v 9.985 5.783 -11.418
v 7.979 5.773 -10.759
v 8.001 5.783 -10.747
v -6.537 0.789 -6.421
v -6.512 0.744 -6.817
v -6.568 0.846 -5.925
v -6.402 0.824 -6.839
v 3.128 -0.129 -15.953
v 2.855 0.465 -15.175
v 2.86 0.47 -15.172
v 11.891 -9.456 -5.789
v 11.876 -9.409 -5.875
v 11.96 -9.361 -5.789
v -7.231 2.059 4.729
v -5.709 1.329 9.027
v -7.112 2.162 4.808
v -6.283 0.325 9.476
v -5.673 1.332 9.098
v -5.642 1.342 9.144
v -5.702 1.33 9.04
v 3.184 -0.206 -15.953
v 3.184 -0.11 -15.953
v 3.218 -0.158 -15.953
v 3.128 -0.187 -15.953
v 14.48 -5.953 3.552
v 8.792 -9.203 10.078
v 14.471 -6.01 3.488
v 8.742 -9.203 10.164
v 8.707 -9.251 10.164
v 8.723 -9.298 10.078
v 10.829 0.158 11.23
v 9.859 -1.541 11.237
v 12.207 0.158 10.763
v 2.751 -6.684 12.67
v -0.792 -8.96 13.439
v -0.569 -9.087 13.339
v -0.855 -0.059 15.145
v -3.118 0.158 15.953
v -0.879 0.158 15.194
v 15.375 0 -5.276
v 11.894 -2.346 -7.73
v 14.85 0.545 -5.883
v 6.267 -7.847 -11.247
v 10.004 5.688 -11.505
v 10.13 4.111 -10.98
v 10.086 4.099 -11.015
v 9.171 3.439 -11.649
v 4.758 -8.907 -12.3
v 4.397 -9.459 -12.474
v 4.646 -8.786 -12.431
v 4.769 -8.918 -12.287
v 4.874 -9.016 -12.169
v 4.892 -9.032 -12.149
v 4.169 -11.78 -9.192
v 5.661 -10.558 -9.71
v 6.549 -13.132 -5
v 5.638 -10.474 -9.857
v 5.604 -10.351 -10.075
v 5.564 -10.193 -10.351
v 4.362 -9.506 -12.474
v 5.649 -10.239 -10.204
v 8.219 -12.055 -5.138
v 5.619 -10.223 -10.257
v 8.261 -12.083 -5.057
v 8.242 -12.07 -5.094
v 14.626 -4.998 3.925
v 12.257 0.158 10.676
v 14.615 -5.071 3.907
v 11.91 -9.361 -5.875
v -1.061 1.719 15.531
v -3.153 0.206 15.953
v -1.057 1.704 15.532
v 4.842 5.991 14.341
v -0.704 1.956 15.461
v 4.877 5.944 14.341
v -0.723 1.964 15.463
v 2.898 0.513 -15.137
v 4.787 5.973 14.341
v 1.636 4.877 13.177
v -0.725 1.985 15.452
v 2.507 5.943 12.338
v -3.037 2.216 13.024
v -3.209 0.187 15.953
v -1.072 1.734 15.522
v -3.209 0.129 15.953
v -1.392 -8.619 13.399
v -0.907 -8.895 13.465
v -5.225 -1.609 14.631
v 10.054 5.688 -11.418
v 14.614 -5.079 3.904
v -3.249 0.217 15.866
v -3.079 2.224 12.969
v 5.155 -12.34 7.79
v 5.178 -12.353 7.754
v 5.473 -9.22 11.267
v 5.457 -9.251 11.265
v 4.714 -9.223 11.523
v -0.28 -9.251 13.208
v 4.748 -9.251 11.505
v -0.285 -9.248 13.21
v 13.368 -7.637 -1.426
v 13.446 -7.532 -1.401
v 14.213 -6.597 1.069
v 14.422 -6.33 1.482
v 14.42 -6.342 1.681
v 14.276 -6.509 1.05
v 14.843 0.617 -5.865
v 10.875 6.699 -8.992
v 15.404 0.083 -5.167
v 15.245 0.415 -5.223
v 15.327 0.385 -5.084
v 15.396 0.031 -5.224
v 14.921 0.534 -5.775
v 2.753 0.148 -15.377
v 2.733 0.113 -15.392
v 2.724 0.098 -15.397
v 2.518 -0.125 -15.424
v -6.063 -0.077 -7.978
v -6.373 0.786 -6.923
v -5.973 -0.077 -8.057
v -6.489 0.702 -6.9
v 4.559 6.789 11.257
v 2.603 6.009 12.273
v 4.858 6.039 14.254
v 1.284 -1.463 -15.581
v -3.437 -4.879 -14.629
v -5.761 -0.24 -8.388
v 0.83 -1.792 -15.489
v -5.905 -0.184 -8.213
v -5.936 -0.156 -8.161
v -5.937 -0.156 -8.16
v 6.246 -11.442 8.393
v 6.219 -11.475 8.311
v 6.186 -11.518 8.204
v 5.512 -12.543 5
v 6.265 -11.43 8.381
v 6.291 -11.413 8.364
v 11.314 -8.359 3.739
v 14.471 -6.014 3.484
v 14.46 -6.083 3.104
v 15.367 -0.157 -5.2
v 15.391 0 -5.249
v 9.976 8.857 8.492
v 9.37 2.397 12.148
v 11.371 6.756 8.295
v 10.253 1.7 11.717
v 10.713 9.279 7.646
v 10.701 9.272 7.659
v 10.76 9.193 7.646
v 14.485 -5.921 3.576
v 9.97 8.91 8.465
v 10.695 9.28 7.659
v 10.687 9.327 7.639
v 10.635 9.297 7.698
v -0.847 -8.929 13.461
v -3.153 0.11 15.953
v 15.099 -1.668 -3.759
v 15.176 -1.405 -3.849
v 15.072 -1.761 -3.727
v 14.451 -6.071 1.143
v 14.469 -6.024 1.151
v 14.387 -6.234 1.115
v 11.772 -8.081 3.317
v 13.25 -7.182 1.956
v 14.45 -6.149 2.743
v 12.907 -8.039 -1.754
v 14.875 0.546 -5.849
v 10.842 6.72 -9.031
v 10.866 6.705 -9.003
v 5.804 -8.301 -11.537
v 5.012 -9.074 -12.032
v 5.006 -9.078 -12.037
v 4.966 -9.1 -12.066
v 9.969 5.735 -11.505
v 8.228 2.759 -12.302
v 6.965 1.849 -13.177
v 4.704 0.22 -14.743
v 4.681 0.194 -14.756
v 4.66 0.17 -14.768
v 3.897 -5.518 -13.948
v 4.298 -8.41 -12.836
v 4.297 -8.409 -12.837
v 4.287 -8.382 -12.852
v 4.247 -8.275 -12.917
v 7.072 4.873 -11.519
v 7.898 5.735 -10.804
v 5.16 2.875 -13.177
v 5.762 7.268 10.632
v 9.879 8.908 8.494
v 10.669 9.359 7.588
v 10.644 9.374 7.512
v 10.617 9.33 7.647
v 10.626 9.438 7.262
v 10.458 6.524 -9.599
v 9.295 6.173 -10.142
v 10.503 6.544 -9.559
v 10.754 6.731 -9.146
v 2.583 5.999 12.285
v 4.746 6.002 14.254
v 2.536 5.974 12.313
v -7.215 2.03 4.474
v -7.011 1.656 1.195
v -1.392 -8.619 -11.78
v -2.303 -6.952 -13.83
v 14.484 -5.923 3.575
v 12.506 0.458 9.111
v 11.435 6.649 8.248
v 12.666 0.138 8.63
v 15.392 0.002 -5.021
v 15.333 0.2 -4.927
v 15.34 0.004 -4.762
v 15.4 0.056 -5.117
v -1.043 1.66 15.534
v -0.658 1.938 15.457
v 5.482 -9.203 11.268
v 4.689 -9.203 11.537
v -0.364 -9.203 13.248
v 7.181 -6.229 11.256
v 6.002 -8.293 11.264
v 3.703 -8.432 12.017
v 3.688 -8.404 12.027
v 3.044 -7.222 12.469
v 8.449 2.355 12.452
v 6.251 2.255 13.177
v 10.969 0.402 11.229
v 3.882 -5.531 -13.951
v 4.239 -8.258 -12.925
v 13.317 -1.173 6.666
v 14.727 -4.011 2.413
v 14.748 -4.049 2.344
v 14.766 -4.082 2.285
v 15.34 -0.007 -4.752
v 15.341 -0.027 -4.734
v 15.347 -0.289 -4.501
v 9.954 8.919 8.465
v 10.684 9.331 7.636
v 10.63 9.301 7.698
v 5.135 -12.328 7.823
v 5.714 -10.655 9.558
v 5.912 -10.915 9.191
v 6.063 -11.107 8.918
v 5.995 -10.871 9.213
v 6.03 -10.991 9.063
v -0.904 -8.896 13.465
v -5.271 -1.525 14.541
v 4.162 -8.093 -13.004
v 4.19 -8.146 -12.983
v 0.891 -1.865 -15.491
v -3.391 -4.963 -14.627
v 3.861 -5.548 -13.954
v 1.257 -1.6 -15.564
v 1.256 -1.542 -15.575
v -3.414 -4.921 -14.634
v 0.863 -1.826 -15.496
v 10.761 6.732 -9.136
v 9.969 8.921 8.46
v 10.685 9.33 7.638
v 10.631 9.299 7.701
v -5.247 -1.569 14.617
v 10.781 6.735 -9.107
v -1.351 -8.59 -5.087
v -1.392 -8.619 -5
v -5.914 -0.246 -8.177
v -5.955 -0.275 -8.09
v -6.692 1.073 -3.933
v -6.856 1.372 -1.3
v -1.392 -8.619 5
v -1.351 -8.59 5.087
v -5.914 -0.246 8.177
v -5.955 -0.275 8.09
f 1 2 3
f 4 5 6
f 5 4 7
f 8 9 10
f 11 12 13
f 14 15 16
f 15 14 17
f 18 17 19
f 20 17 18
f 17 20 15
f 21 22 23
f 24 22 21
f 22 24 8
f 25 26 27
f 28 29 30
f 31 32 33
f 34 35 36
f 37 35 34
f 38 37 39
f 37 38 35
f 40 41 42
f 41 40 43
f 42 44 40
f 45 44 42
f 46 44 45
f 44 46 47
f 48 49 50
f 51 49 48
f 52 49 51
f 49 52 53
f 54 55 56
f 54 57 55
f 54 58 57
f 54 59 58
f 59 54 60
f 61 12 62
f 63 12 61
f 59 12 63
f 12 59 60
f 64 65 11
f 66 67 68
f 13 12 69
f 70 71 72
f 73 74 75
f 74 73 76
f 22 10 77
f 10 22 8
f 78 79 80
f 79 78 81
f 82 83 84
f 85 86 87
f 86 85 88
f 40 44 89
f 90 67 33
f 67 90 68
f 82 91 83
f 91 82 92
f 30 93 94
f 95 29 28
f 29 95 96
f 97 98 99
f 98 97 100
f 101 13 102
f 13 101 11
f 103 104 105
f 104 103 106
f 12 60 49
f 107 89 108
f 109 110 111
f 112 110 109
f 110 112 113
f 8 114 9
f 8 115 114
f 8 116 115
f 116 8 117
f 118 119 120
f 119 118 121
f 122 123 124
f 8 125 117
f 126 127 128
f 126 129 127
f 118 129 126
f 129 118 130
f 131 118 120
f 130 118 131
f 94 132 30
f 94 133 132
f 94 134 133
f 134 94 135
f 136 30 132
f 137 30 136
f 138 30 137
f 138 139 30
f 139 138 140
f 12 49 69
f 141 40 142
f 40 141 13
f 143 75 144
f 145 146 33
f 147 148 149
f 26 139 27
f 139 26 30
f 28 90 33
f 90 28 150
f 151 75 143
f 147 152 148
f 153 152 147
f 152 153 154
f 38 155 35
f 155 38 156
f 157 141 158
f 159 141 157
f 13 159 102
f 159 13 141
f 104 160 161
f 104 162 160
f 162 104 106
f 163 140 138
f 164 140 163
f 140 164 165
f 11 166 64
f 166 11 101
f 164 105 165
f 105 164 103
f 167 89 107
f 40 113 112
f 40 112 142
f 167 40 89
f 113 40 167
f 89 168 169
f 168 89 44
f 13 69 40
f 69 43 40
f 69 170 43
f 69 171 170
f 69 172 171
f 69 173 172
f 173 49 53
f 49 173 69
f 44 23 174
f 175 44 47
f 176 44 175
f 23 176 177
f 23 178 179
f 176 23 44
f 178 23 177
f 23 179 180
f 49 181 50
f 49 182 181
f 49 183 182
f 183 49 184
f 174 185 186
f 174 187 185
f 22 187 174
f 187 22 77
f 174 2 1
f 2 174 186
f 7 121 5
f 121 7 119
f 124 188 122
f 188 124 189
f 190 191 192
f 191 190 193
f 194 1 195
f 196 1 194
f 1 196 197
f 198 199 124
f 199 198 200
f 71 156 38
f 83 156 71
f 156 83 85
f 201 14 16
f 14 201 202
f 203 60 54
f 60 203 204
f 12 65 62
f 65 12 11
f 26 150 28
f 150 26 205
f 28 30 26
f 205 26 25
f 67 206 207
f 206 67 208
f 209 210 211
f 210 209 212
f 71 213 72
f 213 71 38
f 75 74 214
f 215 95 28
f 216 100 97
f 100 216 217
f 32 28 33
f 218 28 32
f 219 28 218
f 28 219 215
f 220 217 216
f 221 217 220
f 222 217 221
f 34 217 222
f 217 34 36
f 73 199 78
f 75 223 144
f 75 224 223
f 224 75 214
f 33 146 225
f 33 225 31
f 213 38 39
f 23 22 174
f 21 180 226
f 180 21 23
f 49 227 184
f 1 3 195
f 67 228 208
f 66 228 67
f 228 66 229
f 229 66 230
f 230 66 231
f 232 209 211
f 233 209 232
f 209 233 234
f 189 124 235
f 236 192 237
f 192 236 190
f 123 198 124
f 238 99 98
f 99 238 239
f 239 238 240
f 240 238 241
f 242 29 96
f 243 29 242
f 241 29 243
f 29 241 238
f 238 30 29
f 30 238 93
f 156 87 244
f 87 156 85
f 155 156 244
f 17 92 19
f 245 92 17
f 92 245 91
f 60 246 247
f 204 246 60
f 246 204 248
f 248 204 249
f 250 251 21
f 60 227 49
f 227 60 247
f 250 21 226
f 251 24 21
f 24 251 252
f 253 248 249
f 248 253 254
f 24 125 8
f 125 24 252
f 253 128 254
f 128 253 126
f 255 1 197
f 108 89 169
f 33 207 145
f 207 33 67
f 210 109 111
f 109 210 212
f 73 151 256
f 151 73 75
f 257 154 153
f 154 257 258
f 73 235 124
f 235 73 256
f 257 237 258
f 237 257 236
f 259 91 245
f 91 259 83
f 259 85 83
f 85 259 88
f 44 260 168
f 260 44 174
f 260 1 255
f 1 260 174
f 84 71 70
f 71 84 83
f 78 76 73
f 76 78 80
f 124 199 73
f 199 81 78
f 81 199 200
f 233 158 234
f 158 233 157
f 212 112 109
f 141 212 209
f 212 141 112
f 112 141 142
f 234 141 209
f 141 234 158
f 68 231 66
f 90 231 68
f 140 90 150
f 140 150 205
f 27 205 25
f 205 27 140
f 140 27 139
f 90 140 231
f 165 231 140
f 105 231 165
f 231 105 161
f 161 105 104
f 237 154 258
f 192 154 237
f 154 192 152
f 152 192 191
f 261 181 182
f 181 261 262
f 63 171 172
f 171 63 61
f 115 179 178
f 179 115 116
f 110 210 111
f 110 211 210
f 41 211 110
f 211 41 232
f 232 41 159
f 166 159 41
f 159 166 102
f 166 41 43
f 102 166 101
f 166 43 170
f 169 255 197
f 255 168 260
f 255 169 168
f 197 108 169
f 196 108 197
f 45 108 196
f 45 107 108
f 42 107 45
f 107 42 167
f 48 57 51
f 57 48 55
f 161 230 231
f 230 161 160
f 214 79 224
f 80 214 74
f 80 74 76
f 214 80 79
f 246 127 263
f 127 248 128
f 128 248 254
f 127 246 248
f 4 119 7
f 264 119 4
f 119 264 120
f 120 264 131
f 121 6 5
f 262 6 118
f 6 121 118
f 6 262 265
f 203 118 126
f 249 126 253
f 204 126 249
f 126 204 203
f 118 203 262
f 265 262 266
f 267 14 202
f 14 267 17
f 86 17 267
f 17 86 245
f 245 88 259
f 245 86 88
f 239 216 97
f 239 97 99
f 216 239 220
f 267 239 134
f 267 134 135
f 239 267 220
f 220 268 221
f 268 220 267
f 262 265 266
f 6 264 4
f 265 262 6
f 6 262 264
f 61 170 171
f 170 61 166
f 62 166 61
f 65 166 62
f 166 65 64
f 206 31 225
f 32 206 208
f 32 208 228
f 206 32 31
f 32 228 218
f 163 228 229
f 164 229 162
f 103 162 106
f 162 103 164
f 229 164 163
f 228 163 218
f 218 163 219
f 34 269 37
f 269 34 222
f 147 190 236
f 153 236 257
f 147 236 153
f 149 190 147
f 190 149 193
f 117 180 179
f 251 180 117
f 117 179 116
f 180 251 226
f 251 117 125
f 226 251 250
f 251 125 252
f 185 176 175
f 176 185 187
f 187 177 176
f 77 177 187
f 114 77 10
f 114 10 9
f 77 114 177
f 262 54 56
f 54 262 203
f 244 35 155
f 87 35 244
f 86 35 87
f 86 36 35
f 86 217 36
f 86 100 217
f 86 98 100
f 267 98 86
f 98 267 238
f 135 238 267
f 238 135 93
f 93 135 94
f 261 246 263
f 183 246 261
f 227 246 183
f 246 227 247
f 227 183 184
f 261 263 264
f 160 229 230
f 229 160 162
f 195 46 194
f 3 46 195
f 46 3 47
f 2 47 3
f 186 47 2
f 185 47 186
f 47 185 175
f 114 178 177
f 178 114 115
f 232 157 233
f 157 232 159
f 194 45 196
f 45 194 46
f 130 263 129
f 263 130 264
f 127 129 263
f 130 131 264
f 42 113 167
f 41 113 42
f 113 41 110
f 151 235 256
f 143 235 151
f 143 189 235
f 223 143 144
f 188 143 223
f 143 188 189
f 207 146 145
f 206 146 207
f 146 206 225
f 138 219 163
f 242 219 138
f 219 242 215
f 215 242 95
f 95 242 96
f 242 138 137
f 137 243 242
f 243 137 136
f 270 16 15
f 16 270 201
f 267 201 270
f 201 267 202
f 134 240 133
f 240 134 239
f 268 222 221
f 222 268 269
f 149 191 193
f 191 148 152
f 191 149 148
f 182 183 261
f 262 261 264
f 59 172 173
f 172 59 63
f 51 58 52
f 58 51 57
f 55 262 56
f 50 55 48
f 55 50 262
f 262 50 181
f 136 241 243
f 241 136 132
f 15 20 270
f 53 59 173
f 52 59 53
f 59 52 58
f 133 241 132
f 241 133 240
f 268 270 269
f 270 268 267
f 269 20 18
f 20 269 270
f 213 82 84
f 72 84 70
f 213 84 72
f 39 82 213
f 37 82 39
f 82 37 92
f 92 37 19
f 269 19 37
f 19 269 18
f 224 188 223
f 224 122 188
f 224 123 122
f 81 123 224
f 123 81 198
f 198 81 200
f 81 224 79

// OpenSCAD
// Auto-generated OpenSCAD file

    inner_points = 10*[[3.624317002584078e-13, 2.953319001906976e-13, 1.618033988749895], [-3.624317002584078e-13, -2.953319001906976e-13, -1.618033988749895], [1.4067368092917045, -0.799453274515584, -1.6918183476653185e-13], [0.799453274515584, 1.4067368092917045, -4.358384739871853e-13], [-0.4563237566115435, 0.834432217941957, 1.3090169943748973], [-0.45632375661213, 0.8344322179414793, -1.3090169943749976], [0.45632375661213, -0.8344322179414793, 1.3090169943749976], [0.4563237566115435, -0.834432217941957, -1.3090169943748973], [0.9504130526801611, 0.03497894342637298, 1.309016994374728], [0.9504130526795745, 0.03497894342589519, -1.3090169943751668], [-0.7383473480718745, 1.350139689937751, 0.49999999999991895], [-0.7383473480720981, 1.3501396899375684, -0.500000000000081], [0.7383473480720981, -1.3501396899375684, 0.500000000000081], [0.7383473480718745, -1.350139689937751, -0.49999999999991895], [1.5378006225876821, 0.056597119354135916, 0.4999999999996452], [1.5378006225874585, 0.056597119353953396, -0.5000000000003548], [0.21206570460806262, 1.3851186333639414, 0.8090169943746471], [0.21206570460770024, 1.3851186333636463, -0.8090169943752478], [1.0814768659759149, 0.8910293372959104, 0.8090169943745426], [1.0814768659755525, 0.8910293372956152, -0.8090169943753523], [-0.8694111613678522, 0.49408929606803104, 1.0456012416478531e-13], [-0.5873875699075214, -0.02161817592776291, 0.809016994375083], [-0.5873875699078839, -0.021618175928058286, -0.8090169943748119], [-0.13106381329575384, -0.8560503938695374, 0.5000000000001856], [-0.13106381329597788, -0.8560503938697199, -0.49999999999981437]];

    outer_points = 10*[[-0.4827045868491299, -0.5943615441771533, -1.4253998124694895], [0.4827045868491299, 0.5943615441771533, 1.4253998124694895], [1.5325422089871936, 0.0, -0.5189878287807413], [0.19064272411334998, -1.5049147296618652, 0.56295736689317], [-1.097875476912321, -0.9458928165929492, -0.7197153641977476], [-0.31684304886495324, 0.01580436349155695, 1.5866299799356127], [0.31684304886495324, -0.01580436349155695, -1.5866299799356127], [1.097875476912321, 0.9458928165929492, 0.7197153641977476], [0.43466673207487266, -0.9458928165929492, -1.2387031929784889], [1.2156991601222404, 0.01580436349155695, 1.0676421511548713], [-1.2936952502100056, -0.9361251827846091, 0.2608758909720249], [-0.9953674090117679, -0.5687895468772561, 1.1418214226358954], [0.9953674090117679, 0.5687895468772561, -1.1418214226358954], [1.2936952502100056, 0.9361251827846091, -0.2608758909720249], [1.186010133125118, -0.9361251827846091, -0.5788640557427255], [1.4843379743233558, -0.5687895468772561, 0.3020814759211451], [-0.5607006769368953, -1.5146823634702054, -0.09688177034259327], [-0.07799609008776537, -0.9203208192930521, 1.3285180421268963], [0.38646249741103483, -1.5146823634702054, -0.4176338882766023], [0.8691670842601649, -0.9203208192930521, 1.0077659241928874], [-0.9471631743479302, 0.0, 0.32075211793400904], [-0.7513434010502453, -0.009767633808340115, -0.6598391372357633], [-0.26863881420111535, 0.5845939103688131, 0.7655606752337263], [0.04820423466383783, 0.5687895468772561, -0.8210693047018864], [0.34653207586207563, 0.9361251827846091, 0.059876226961984164]];

    // Convex hull for inner set (I)
    module inner_hull() {
        hull() {
            for (p = inner_points) {
                translate(p) sphere(r=0.1);
            }
        }
    }

    // Convex hull for outer set (O) minus inner hull (O \ I)
    module outer_minus_inner() {
        difference() {
            hull() {
                for (p = outer_points) {
                    translate(p) sphere(r=0.1);
                }
            }
            inner_hull(); // Subtract inner hull
        }
    }

    // Convex hull for outer set (O) minus all translated inner hulls
    module outer_minus_AllTranslationInner() {
        difference() {
            hull() {
                for (p = outer_points) {
                    translate(p) sphere(r=0.1);
                }
            }
            hull() {
                translate([0,0,50]) inner_hull();
                translate([0,0,-50]) inner_hull();
            }; // Subtract translated inner hulls
        }
    }

    // Difference between outer_minus_inner and outer_minus_AllTranslationInner
    module outer_minus_inner_diff() {
        difference() {
            // Outer minus inner
            difference() {
                hull() {
                    for (p = outer_points) {
                        translate(p) sphere(r=0.1);
                    }
                }
                inner_hull();
            }

            // Subtract Outer minus AllTranslationInner
            difference() {
                hull() {
                    for (p = outer_points) {
                        translate(p) sphere(r=0.1);
                    }
                }
                hull() {
                    translate([0,0,50]) inner_hull();
                    translate([0,0,-50]) inner_hull();
                };
            }
        }
    }

    // Rendering all with colors applied
    color([1, 1, 0, 1]) outer_minus_inner_diff(); // Opaque yellow
    
